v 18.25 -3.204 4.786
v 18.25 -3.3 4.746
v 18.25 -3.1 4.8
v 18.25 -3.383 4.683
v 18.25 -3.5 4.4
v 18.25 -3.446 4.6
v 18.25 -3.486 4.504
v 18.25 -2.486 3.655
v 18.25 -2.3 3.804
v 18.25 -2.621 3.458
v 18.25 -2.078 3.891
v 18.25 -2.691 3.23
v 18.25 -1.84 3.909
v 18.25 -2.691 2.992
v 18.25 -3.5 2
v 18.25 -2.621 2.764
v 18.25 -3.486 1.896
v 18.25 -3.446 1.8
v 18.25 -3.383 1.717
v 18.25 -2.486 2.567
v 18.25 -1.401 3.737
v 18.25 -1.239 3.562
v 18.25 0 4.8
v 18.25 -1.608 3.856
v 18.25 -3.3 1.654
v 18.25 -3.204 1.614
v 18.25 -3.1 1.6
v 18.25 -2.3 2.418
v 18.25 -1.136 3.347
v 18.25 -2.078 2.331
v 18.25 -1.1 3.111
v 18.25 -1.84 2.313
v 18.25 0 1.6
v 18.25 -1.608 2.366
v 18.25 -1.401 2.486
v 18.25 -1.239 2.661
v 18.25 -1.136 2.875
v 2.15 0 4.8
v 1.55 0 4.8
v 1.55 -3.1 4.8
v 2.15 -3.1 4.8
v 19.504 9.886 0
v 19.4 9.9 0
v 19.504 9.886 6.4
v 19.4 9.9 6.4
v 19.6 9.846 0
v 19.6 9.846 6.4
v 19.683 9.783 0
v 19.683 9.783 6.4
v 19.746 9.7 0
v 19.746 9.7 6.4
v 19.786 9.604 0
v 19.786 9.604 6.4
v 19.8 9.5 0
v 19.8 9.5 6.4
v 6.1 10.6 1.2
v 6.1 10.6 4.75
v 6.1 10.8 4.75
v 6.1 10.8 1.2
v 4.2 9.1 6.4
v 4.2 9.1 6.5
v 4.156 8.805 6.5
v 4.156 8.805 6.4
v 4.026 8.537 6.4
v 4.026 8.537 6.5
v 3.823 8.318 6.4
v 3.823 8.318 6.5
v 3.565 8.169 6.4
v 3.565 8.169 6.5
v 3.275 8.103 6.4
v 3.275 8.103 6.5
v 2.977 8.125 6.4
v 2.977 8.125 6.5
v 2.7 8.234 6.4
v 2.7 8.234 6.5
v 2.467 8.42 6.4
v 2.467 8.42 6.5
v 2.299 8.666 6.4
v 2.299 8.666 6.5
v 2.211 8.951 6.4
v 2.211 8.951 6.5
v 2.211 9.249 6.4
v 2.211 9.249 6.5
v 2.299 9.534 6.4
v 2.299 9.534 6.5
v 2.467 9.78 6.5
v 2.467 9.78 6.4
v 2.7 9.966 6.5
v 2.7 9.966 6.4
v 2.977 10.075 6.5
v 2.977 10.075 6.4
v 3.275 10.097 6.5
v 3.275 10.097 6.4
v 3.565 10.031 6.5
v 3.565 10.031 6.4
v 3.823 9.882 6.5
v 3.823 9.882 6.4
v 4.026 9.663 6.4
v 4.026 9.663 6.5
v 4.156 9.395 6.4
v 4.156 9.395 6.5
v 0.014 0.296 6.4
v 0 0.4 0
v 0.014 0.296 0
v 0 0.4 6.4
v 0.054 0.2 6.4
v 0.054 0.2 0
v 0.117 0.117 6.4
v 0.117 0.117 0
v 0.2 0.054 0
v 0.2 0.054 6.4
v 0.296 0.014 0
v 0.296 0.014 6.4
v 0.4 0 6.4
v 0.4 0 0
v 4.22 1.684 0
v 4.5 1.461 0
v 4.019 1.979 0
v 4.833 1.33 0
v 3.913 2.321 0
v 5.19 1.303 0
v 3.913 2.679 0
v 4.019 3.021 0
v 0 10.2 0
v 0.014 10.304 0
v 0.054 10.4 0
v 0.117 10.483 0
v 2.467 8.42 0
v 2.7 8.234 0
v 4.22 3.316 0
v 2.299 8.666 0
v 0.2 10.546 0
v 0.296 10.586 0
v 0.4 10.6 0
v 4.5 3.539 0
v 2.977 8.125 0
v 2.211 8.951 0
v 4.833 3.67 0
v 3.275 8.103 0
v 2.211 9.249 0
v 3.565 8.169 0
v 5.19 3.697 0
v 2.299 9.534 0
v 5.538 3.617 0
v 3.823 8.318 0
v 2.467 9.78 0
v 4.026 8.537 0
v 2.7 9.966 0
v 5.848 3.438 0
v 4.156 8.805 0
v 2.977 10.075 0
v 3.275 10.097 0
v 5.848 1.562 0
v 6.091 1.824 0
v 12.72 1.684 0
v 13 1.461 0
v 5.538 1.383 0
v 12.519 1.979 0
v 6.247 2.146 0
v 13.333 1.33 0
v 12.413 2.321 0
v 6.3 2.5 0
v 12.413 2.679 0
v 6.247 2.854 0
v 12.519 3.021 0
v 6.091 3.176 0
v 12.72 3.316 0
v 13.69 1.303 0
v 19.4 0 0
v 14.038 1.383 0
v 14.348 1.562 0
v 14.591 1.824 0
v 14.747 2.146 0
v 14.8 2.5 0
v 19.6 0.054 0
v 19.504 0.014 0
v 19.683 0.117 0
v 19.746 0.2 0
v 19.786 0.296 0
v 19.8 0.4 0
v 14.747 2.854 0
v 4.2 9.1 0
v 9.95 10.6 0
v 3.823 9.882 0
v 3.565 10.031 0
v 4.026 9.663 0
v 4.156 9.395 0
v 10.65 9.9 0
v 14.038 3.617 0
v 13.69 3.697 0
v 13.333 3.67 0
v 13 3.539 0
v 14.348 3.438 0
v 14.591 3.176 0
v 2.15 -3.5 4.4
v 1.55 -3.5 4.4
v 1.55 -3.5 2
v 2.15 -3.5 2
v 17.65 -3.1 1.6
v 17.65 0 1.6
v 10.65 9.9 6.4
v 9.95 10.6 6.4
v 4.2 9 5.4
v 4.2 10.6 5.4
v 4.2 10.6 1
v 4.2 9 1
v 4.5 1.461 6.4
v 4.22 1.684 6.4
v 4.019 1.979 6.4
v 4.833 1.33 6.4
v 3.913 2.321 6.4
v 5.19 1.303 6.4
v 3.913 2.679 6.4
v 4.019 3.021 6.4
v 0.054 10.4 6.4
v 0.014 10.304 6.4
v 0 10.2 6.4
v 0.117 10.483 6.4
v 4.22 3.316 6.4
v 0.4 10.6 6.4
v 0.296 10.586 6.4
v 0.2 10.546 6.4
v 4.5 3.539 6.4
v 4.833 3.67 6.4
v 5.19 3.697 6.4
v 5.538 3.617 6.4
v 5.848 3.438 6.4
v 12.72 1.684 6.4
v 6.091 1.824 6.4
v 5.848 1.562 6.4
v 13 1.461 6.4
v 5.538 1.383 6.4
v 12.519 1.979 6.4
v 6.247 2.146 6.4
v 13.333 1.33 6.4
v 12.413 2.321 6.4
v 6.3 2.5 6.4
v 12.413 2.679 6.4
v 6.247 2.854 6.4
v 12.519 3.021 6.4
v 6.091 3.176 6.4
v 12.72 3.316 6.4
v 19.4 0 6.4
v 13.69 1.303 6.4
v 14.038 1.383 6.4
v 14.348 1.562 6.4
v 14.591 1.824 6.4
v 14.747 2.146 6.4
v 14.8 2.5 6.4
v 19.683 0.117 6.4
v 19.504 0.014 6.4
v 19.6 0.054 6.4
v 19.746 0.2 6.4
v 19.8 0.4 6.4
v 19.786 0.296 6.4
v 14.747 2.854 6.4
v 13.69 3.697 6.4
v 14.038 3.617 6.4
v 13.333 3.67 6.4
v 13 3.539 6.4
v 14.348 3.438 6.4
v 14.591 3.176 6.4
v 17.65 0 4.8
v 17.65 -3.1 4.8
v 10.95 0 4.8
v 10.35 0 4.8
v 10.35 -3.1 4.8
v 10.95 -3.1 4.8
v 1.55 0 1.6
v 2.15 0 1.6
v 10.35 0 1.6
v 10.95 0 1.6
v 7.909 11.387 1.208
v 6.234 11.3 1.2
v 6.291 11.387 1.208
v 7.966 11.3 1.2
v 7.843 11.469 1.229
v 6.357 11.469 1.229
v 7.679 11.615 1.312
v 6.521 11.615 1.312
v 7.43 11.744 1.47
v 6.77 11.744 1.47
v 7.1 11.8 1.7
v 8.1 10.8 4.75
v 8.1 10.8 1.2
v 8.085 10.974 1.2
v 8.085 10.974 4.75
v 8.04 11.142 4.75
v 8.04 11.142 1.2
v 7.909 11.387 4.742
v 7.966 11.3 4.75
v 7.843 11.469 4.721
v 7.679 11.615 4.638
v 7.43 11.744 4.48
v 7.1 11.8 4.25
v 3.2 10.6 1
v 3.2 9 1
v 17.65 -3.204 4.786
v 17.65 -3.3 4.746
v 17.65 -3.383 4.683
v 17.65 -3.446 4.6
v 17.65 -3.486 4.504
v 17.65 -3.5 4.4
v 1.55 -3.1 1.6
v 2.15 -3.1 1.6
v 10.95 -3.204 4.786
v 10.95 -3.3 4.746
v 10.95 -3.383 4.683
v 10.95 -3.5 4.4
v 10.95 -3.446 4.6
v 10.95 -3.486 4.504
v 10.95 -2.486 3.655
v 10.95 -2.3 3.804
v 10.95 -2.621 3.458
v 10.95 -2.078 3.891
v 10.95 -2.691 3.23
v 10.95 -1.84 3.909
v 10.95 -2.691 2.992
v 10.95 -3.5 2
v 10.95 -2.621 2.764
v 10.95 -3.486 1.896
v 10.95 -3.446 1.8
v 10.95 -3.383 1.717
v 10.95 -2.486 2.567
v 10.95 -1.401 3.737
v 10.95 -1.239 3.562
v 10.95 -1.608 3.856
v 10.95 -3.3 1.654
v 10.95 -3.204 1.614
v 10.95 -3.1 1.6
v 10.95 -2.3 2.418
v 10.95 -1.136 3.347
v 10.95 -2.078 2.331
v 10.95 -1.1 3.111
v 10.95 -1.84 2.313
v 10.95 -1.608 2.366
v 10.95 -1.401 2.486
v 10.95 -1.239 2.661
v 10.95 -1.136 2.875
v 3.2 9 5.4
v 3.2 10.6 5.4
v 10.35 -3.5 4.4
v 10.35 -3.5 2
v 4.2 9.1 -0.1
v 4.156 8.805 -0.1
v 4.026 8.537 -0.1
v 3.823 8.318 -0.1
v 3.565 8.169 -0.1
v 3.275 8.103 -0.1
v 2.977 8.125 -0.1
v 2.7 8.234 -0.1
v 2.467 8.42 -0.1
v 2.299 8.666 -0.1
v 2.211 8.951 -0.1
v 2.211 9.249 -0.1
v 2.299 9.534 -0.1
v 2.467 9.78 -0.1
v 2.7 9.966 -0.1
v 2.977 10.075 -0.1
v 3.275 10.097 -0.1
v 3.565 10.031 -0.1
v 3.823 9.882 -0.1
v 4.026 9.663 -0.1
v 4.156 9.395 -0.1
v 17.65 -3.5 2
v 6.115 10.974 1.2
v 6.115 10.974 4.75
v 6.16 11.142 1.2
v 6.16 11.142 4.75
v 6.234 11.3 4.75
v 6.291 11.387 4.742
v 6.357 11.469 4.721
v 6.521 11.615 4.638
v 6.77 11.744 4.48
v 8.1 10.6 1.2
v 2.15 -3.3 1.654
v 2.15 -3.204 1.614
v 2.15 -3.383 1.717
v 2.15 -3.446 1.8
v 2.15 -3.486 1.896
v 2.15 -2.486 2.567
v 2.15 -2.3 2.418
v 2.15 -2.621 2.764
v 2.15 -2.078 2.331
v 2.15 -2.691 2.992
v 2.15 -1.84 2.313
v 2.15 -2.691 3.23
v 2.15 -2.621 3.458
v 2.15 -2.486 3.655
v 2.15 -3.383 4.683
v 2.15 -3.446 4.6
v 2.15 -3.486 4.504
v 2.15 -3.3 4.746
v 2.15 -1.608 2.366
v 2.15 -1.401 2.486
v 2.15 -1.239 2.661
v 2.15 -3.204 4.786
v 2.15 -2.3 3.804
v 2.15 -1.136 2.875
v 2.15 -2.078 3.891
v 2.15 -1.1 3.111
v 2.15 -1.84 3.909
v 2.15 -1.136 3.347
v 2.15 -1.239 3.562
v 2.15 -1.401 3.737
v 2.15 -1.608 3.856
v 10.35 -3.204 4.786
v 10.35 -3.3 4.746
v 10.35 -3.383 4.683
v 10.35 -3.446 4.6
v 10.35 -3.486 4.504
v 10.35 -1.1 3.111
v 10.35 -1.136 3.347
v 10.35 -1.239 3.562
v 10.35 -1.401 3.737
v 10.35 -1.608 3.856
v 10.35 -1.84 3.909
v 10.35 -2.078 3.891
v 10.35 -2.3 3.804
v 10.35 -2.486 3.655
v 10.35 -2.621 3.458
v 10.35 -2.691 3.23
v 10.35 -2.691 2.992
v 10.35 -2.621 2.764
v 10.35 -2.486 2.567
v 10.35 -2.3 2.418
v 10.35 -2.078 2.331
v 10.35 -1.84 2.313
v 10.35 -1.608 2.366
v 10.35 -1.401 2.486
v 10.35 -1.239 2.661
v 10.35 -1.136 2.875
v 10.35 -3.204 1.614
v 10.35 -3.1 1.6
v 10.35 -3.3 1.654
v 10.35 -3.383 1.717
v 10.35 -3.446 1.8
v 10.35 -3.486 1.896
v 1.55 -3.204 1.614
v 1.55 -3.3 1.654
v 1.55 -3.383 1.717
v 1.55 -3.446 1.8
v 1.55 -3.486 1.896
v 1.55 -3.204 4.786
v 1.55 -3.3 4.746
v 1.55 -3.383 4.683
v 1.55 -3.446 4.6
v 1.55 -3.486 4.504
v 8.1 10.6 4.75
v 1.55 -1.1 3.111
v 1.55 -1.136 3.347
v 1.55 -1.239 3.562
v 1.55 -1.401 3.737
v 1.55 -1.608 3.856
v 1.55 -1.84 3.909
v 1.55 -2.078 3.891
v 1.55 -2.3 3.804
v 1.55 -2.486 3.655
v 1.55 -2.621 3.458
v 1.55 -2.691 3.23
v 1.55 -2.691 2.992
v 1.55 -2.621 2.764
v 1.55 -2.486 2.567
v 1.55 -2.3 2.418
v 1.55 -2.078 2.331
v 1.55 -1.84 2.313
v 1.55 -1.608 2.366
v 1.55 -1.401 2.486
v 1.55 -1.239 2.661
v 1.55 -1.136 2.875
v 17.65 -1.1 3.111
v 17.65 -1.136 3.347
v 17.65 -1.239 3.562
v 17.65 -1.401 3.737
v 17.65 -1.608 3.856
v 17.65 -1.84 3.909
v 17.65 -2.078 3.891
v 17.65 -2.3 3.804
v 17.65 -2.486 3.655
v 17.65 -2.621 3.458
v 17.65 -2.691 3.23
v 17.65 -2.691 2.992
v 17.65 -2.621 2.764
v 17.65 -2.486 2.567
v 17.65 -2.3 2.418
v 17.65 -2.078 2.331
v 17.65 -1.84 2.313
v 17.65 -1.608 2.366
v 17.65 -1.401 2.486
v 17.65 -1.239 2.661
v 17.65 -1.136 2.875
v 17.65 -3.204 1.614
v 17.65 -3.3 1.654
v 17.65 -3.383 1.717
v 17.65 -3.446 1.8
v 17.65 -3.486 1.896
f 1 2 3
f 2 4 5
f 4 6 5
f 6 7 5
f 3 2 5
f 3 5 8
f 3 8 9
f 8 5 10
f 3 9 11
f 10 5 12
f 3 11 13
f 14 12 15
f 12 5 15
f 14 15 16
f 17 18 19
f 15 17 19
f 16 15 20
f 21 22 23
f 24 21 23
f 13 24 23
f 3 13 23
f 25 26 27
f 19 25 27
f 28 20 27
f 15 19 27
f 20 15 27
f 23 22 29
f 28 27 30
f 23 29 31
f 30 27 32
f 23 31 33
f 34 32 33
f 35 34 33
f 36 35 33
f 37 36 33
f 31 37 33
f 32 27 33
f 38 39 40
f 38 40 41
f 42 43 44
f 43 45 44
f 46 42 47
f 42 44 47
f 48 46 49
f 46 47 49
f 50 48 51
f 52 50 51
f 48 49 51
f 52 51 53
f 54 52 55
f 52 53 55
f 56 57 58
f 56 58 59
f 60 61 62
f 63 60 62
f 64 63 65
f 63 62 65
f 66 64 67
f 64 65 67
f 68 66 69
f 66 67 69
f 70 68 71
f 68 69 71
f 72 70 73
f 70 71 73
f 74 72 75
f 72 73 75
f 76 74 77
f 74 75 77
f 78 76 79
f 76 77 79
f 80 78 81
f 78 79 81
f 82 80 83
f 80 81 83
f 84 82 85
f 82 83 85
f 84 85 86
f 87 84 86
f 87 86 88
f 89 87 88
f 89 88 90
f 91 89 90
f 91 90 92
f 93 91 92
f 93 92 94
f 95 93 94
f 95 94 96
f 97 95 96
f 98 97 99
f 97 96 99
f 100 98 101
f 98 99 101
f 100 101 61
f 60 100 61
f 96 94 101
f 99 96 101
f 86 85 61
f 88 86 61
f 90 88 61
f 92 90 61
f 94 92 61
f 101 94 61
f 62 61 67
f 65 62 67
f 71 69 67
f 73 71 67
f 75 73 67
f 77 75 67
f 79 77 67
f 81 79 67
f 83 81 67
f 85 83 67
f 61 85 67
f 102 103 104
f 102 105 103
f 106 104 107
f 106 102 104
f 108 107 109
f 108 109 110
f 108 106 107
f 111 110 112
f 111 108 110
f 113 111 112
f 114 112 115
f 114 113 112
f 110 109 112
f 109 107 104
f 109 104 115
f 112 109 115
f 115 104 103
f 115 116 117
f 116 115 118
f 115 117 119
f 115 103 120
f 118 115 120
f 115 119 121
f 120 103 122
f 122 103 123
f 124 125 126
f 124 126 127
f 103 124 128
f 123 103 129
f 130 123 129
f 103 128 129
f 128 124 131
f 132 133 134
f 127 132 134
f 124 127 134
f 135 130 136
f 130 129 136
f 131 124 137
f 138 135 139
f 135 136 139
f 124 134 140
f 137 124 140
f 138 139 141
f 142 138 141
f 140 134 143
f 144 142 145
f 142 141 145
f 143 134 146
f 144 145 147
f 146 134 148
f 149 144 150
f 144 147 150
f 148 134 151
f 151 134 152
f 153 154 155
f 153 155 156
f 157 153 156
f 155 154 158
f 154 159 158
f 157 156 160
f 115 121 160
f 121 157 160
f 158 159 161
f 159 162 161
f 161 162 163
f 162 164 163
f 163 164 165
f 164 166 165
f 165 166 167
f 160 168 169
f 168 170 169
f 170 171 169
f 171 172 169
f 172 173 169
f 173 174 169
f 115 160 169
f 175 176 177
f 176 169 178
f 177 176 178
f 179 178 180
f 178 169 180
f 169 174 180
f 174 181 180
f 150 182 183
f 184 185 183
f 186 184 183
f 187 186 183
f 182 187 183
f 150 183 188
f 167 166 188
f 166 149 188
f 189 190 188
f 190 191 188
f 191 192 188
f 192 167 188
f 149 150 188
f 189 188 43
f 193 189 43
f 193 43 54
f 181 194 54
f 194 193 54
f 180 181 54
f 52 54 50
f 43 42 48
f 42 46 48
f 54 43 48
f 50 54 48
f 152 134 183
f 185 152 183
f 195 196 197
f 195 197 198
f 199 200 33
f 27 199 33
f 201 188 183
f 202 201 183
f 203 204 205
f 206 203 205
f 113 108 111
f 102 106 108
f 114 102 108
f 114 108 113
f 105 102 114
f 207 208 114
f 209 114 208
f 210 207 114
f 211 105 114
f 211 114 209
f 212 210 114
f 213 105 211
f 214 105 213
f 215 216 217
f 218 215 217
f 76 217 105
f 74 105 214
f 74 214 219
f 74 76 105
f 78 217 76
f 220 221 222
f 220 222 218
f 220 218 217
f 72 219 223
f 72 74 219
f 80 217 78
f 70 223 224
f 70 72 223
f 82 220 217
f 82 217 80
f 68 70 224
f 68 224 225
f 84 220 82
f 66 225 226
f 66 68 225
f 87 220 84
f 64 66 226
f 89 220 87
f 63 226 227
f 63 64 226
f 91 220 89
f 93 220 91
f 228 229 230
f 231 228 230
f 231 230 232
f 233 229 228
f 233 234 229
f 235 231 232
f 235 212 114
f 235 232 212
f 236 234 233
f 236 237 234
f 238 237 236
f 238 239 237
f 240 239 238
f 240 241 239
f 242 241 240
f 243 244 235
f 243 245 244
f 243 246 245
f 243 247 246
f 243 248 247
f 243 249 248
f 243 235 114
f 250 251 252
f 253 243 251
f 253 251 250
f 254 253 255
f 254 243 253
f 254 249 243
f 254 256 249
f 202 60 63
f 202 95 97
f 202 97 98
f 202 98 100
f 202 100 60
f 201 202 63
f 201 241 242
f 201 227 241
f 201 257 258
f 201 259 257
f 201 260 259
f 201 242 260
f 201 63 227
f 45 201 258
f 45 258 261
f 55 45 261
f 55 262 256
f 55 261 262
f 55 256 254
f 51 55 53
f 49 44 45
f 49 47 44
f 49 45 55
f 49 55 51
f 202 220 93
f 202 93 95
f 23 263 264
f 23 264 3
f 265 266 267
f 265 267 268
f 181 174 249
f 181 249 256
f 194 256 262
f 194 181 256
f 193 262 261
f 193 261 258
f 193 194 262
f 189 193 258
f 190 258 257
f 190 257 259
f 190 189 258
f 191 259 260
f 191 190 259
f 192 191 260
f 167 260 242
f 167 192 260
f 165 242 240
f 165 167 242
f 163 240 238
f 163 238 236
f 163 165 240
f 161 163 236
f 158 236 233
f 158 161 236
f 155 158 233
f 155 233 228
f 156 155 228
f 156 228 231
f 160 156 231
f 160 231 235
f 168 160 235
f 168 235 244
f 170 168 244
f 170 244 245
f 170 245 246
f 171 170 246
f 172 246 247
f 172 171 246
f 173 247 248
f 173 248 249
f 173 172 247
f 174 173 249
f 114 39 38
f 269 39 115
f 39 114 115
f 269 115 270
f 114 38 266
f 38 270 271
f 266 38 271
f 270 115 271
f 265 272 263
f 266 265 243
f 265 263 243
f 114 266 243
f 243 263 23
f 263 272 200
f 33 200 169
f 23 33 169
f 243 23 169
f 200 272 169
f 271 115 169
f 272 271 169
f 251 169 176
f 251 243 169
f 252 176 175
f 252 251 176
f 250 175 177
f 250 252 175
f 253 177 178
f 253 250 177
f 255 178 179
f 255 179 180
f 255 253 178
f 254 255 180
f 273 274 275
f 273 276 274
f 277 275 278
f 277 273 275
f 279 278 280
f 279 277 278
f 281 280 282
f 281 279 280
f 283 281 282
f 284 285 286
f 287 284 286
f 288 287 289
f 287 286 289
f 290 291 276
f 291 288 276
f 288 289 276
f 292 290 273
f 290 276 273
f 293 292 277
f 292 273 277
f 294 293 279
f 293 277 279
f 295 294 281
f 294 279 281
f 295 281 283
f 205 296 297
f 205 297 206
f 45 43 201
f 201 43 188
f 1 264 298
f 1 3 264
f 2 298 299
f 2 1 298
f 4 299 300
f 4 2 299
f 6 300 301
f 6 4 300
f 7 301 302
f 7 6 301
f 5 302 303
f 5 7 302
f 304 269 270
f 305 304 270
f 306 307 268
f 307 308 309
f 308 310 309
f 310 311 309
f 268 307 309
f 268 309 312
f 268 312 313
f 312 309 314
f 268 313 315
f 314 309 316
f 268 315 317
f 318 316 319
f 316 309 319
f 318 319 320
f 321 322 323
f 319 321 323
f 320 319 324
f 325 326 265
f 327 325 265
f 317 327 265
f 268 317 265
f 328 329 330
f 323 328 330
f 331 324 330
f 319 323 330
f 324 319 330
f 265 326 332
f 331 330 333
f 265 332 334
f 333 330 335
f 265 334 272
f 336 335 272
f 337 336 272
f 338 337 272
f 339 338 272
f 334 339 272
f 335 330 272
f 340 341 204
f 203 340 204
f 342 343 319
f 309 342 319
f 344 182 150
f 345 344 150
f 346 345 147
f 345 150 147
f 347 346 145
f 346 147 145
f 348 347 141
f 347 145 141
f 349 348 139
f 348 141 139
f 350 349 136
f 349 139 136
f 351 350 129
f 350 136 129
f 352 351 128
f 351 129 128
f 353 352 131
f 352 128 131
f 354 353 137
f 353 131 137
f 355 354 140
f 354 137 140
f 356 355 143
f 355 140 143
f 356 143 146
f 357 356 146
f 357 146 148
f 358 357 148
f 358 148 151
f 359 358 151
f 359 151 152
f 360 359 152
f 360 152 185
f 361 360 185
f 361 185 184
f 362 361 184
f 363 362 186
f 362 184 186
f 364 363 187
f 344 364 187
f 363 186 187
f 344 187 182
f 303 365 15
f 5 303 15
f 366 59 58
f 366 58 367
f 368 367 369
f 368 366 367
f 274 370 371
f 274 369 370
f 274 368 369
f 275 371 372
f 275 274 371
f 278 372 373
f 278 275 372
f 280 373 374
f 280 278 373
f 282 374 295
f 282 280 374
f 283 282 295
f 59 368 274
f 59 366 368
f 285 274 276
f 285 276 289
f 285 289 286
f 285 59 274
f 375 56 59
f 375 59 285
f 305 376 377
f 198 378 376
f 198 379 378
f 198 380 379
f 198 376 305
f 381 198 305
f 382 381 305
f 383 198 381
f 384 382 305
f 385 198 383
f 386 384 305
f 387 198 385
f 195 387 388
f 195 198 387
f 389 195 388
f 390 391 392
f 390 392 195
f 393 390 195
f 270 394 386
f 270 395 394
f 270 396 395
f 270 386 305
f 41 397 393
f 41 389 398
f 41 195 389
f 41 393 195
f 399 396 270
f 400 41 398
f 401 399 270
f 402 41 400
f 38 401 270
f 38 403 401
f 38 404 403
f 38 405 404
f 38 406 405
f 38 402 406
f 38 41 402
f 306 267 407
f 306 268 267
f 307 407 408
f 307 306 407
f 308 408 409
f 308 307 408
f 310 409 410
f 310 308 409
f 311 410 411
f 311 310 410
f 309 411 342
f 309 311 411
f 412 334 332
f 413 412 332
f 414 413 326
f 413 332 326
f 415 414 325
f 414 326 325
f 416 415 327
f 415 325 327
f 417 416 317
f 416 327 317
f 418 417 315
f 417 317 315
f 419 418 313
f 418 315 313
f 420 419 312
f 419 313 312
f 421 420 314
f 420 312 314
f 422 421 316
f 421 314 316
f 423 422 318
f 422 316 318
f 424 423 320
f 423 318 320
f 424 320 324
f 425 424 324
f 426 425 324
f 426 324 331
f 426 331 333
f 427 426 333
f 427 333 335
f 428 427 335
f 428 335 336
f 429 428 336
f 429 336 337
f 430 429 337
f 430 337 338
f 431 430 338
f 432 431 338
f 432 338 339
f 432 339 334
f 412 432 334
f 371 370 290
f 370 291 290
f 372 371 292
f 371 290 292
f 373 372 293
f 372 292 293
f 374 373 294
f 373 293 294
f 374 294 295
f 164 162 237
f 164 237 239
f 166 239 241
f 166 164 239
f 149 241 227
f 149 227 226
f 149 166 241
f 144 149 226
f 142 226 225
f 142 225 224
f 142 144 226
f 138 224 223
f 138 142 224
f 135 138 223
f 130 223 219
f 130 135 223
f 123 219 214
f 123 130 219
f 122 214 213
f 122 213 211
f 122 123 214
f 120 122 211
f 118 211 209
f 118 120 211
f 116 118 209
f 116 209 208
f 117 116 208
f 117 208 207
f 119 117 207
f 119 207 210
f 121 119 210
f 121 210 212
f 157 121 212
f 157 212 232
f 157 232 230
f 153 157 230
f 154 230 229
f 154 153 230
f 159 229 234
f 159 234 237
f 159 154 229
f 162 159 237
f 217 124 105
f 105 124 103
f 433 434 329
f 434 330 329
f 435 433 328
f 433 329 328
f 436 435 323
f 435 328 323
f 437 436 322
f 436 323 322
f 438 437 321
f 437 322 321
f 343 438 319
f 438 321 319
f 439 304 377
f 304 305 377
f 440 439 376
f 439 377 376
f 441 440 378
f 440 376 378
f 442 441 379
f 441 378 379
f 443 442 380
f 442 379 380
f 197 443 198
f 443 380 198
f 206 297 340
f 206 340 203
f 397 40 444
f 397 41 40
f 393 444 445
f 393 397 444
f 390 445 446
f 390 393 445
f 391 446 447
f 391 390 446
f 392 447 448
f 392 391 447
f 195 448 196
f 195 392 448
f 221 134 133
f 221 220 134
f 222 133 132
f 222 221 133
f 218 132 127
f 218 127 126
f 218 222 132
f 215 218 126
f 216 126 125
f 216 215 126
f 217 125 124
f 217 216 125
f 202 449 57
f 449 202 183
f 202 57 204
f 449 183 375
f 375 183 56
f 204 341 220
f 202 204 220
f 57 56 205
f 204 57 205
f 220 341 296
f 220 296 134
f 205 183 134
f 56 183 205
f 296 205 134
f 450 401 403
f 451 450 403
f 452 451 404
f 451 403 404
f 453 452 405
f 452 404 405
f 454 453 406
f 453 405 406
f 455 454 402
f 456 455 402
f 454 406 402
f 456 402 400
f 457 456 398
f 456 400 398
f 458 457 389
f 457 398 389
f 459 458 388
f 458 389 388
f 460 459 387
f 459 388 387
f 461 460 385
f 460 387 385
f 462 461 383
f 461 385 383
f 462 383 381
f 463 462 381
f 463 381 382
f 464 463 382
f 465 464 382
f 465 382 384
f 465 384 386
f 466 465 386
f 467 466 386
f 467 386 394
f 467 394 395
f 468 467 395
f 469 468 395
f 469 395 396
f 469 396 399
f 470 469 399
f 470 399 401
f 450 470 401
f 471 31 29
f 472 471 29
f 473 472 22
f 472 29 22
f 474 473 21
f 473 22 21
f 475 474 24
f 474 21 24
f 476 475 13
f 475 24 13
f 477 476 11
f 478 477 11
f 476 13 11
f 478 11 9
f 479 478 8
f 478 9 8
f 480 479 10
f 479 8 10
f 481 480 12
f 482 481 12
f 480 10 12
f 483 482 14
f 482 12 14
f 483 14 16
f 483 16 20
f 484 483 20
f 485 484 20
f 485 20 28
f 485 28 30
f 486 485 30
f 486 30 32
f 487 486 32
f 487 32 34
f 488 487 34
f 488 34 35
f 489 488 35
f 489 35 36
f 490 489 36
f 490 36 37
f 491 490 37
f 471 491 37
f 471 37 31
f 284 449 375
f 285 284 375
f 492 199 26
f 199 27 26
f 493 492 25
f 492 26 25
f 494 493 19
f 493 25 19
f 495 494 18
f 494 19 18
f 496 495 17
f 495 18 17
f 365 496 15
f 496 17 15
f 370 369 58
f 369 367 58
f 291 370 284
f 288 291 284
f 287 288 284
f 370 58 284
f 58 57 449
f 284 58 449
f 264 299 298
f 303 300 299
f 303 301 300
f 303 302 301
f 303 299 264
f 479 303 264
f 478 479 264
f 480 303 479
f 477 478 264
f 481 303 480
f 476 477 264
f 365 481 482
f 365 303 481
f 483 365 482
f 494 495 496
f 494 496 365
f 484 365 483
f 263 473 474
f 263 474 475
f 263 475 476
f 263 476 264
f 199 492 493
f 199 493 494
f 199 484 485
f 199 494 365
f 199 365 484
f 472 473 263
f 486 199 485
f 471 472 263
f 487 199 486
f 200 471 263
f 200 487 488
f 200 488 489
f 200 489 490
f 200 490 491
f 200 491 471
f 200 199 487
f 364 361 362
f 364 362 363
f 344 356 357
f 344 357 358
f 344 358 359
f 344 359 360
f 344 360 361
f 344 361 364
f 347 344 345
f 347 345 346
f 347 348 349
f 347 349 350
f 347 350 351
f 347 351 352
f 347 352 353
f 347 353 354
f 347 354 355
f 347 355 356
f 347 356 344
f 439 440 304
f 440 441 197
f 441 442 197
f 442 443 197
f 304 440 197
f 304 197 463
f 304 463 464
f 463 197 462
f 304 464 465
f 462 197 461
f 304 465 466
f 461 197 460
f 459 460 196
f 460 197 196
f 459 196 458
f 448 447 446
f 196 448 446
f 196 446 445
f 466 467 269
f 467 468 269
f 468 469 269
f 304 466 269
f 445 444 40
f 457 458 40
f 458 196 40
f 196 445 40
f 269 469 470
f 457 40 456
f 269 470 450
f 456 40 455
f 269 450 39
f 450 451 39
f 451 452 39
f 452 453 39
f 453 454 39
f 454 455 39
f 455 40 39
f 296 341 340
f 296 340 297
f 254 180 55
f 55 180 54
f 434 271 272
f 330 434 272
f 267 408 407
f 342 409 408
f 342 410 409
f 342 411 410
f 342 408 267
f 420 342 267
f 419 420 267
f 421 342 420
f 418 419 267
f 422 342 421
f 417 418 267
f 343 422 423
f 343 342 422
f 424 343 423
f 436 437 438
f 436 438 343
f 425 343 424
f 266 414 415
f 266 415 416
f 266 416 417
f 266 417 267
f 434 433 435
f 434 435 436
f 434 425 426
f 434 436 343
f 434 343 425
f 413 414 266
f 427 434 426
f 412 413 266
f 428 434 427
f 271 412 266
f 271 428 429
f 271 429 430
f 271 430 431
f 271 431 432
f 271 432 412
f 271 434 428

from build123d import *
from OCP.BRepFilletAPI import BRepFilletAPI_MakeFillet

# Parameters (mm, degrees)
ESQUISSE1_R             = 1.2
BOSS_EXTRU_1_DEPTH      = 6.4
BOSS_EXTRU_2_START      = -3.2
ESQUISSE4_W             = 0.6
ESQUISSE4_H             = 3.5
BOSS_EXTRU_2_DEPTH      = 1.6
ESQUISSE5_R             = 0.8
ENL_V_MAT_EXTRU_1_DEPTH = 23.054081255
ESQUISSE6_W             = 1
ESQUISSE6_H             = 4.4
ENL_V_MAT_EXTRU_2_DEPTH = 1.6
ESQUISSE6_3_W           = 2
ESQUISSE6_3_H           = 3.55
BOSS_EXTRU_3_DEPTH      = 1.2
CONG_2_R                = 1
CONG_2_R_2              = 0.5
ESQUISSE7_R             = 1
BOSS_EXTRU_9_DEPTH      = 0.1
BOSS_EXTRU_10_START     = -6.5
ESQUISSE7_3_R           = 1
BOSS_EXTRU_10_DEPTH     = 0.1
CONG_1_R                = 0.4


with BuildPart() as part:
    # Esquisse1 → Boss.-Extru.1 (new body)
    with BuildSketch(Plane.XY):
        Polygon((0, 0), (19.8, 0), (19.8, 9.9), (10.65, 9.9), (9.95, 10.6), (0, 10.6), align=None)
        with Locations((5.1, 2.5)):
            Circle(ESQUISSE1_R, mode=Mode.SUBTRACT)
        with Locations((13.6, 2.5)):
            Circle(ESQUISSE1_R, mode=Mode.SUBTRACT)
    extrude(amount=BOSS_EXTRU_1_DEPTH)

    # Esquisse4 → Boss.-Extru.2 (add, symmetric)
    with BuildSketch(Plane.XY.offset(6.4).offset(BOSS_EXTRU_2_START)):
        with Locations((17.95, -1.75)):
            Rectangle(ESQUISSE4_W, ESQUISSE4_H)
        with Locations((10.65, -1.75)):
            Rectangle(ESQUISSE4_W, ESQUISSE4_H)
        with Locations((1.85, -1.75)):
            Rectangle(ESQUISSE4_W, ESQUISSE4_H)
    extrude(amount=BOSS_EXTRU_2_DEPTH, both=True)

    # Esquisse5 → Enlèv. mat.-Extru.1 (cut, through all)
    with BuildSketch(Plane(origin=(18.25, 0, 0), x_dir=(0, 0, -1), z_dir=(1, 0, 0))):
        with Locations(Location((-3.111189777, -1.9, 0), (0, 0, 90))):
            Circle(ESQUISSE5_R)
    extrude(amount=-ENL_V_MAT_EXTRU_1_DEPTH, mode=Mode.SUBTRACT)

    # Esquisse6 → Enlèv. mat.-Extru.2 (cut)
    with BuildSketch(Plane(origin=(0, 10.6, 0), x_dir=(1, 0, 0), z_dir=(0, 1, 0))):
        with Locations((3.7, -3.2)):
            Rectangle(ESQUISSE6_W, ESQUISSE6_H)
    extrude(amount=-ENL_V_MAT_EXTRU_2_DEPTH, mode=Mode.SUBTRACT)

    # Esquisse6<3> → Boss.-Extru.3 (add)
    with BuildSketch(Plane(origin=(0, 10.6, 0), x_dir=(1, 0, 0), z_dir=(0, 1, 0))):
        with Locations((7.1, -2.975)):
            Rectangle(ESQUISSE6_3_W, ESQUISSE6_3_H)
    extrude(amount=BOSS_EXTRU_3_DEPTH)

    # Congé2
    cong_2_edges_1 = [part.edges().sort_by_distance(p)[0] for p in [
        (8.1, 11.8, 2.975),
        (6.1, 11.8, 2.975),
    ]]
    cong_2_edges_2 = [part.edges().sort_by_distance(p)[0] for p in [
        (7.1, 11.8, 4.75),
        (7.1, 11.8, 1.2),
    ]]
    cong_2 = BRepFilletAPI_MakeFillet(part.part.solid().wrapped)
    for e in cong_2_edges_1:
        cong_2.Add(CONG_2_R - 0.0001, e.wrapped)
    for e in cong_2_edges_2:
        cong_2.Add(CONG_2_R_2 - 0.0001, e.wrapped)
    add(Compound.cast(cong_2.Shape()), mode=Mode.REPLACE)  # a hair under: the kernel refuses the full size

    # Esquisse7 → Boss.-Extru.9 (add)
    with BuildSketch(Plane(origin=(0, 0, 0), x_dir=(-1, 0, 0), z_dir=(0, 0, -1))):
        with Locations(Location((-3.2, 9.1, 0), (0, 0, 180))):
            Circle(ESQUISSE7_R)
    extrude(amount=BOSS_EXTRU_9_DEPTH)

    # Esquisse7<3> → Boss.-Extru.10 (add)
    with BuildSketch(Plane(origin=(0, 0, 0), x_dir=(-1, 0, 0), z_dir=(0, 0, -1)).offset(BOSS_EXTRU_10_START)):
        with Locations(Location((-3.2, 9.1, 0), (0, 0, 180))):
            Circle(ESQUISSE7_3_R)
    extrude(amount=BOSS_EXTRU_10_DEPTH)

    # Congé1
    cong_1_edges = [part.edges().sort_by_distance(p)[0] for p in [
        (0, 10.6, 3.2),
        (19.8, 9.9, 3.2),
        (19.8, 0, 3.2),
        (0, 0, 3.2),
        (17.95, -3.5, 1.6),
        (17.95, -3.5, 4.8),
        (10.65, -3.5, 1.6),
        (10.65, -3.5, 4.8),
        (1.85, -3.5, 1.6),
        (1.85, -3.5, 4.8),
    ]]
    fillet(cong_1_edges, radius=CONG_1_R)


solid = part.part
